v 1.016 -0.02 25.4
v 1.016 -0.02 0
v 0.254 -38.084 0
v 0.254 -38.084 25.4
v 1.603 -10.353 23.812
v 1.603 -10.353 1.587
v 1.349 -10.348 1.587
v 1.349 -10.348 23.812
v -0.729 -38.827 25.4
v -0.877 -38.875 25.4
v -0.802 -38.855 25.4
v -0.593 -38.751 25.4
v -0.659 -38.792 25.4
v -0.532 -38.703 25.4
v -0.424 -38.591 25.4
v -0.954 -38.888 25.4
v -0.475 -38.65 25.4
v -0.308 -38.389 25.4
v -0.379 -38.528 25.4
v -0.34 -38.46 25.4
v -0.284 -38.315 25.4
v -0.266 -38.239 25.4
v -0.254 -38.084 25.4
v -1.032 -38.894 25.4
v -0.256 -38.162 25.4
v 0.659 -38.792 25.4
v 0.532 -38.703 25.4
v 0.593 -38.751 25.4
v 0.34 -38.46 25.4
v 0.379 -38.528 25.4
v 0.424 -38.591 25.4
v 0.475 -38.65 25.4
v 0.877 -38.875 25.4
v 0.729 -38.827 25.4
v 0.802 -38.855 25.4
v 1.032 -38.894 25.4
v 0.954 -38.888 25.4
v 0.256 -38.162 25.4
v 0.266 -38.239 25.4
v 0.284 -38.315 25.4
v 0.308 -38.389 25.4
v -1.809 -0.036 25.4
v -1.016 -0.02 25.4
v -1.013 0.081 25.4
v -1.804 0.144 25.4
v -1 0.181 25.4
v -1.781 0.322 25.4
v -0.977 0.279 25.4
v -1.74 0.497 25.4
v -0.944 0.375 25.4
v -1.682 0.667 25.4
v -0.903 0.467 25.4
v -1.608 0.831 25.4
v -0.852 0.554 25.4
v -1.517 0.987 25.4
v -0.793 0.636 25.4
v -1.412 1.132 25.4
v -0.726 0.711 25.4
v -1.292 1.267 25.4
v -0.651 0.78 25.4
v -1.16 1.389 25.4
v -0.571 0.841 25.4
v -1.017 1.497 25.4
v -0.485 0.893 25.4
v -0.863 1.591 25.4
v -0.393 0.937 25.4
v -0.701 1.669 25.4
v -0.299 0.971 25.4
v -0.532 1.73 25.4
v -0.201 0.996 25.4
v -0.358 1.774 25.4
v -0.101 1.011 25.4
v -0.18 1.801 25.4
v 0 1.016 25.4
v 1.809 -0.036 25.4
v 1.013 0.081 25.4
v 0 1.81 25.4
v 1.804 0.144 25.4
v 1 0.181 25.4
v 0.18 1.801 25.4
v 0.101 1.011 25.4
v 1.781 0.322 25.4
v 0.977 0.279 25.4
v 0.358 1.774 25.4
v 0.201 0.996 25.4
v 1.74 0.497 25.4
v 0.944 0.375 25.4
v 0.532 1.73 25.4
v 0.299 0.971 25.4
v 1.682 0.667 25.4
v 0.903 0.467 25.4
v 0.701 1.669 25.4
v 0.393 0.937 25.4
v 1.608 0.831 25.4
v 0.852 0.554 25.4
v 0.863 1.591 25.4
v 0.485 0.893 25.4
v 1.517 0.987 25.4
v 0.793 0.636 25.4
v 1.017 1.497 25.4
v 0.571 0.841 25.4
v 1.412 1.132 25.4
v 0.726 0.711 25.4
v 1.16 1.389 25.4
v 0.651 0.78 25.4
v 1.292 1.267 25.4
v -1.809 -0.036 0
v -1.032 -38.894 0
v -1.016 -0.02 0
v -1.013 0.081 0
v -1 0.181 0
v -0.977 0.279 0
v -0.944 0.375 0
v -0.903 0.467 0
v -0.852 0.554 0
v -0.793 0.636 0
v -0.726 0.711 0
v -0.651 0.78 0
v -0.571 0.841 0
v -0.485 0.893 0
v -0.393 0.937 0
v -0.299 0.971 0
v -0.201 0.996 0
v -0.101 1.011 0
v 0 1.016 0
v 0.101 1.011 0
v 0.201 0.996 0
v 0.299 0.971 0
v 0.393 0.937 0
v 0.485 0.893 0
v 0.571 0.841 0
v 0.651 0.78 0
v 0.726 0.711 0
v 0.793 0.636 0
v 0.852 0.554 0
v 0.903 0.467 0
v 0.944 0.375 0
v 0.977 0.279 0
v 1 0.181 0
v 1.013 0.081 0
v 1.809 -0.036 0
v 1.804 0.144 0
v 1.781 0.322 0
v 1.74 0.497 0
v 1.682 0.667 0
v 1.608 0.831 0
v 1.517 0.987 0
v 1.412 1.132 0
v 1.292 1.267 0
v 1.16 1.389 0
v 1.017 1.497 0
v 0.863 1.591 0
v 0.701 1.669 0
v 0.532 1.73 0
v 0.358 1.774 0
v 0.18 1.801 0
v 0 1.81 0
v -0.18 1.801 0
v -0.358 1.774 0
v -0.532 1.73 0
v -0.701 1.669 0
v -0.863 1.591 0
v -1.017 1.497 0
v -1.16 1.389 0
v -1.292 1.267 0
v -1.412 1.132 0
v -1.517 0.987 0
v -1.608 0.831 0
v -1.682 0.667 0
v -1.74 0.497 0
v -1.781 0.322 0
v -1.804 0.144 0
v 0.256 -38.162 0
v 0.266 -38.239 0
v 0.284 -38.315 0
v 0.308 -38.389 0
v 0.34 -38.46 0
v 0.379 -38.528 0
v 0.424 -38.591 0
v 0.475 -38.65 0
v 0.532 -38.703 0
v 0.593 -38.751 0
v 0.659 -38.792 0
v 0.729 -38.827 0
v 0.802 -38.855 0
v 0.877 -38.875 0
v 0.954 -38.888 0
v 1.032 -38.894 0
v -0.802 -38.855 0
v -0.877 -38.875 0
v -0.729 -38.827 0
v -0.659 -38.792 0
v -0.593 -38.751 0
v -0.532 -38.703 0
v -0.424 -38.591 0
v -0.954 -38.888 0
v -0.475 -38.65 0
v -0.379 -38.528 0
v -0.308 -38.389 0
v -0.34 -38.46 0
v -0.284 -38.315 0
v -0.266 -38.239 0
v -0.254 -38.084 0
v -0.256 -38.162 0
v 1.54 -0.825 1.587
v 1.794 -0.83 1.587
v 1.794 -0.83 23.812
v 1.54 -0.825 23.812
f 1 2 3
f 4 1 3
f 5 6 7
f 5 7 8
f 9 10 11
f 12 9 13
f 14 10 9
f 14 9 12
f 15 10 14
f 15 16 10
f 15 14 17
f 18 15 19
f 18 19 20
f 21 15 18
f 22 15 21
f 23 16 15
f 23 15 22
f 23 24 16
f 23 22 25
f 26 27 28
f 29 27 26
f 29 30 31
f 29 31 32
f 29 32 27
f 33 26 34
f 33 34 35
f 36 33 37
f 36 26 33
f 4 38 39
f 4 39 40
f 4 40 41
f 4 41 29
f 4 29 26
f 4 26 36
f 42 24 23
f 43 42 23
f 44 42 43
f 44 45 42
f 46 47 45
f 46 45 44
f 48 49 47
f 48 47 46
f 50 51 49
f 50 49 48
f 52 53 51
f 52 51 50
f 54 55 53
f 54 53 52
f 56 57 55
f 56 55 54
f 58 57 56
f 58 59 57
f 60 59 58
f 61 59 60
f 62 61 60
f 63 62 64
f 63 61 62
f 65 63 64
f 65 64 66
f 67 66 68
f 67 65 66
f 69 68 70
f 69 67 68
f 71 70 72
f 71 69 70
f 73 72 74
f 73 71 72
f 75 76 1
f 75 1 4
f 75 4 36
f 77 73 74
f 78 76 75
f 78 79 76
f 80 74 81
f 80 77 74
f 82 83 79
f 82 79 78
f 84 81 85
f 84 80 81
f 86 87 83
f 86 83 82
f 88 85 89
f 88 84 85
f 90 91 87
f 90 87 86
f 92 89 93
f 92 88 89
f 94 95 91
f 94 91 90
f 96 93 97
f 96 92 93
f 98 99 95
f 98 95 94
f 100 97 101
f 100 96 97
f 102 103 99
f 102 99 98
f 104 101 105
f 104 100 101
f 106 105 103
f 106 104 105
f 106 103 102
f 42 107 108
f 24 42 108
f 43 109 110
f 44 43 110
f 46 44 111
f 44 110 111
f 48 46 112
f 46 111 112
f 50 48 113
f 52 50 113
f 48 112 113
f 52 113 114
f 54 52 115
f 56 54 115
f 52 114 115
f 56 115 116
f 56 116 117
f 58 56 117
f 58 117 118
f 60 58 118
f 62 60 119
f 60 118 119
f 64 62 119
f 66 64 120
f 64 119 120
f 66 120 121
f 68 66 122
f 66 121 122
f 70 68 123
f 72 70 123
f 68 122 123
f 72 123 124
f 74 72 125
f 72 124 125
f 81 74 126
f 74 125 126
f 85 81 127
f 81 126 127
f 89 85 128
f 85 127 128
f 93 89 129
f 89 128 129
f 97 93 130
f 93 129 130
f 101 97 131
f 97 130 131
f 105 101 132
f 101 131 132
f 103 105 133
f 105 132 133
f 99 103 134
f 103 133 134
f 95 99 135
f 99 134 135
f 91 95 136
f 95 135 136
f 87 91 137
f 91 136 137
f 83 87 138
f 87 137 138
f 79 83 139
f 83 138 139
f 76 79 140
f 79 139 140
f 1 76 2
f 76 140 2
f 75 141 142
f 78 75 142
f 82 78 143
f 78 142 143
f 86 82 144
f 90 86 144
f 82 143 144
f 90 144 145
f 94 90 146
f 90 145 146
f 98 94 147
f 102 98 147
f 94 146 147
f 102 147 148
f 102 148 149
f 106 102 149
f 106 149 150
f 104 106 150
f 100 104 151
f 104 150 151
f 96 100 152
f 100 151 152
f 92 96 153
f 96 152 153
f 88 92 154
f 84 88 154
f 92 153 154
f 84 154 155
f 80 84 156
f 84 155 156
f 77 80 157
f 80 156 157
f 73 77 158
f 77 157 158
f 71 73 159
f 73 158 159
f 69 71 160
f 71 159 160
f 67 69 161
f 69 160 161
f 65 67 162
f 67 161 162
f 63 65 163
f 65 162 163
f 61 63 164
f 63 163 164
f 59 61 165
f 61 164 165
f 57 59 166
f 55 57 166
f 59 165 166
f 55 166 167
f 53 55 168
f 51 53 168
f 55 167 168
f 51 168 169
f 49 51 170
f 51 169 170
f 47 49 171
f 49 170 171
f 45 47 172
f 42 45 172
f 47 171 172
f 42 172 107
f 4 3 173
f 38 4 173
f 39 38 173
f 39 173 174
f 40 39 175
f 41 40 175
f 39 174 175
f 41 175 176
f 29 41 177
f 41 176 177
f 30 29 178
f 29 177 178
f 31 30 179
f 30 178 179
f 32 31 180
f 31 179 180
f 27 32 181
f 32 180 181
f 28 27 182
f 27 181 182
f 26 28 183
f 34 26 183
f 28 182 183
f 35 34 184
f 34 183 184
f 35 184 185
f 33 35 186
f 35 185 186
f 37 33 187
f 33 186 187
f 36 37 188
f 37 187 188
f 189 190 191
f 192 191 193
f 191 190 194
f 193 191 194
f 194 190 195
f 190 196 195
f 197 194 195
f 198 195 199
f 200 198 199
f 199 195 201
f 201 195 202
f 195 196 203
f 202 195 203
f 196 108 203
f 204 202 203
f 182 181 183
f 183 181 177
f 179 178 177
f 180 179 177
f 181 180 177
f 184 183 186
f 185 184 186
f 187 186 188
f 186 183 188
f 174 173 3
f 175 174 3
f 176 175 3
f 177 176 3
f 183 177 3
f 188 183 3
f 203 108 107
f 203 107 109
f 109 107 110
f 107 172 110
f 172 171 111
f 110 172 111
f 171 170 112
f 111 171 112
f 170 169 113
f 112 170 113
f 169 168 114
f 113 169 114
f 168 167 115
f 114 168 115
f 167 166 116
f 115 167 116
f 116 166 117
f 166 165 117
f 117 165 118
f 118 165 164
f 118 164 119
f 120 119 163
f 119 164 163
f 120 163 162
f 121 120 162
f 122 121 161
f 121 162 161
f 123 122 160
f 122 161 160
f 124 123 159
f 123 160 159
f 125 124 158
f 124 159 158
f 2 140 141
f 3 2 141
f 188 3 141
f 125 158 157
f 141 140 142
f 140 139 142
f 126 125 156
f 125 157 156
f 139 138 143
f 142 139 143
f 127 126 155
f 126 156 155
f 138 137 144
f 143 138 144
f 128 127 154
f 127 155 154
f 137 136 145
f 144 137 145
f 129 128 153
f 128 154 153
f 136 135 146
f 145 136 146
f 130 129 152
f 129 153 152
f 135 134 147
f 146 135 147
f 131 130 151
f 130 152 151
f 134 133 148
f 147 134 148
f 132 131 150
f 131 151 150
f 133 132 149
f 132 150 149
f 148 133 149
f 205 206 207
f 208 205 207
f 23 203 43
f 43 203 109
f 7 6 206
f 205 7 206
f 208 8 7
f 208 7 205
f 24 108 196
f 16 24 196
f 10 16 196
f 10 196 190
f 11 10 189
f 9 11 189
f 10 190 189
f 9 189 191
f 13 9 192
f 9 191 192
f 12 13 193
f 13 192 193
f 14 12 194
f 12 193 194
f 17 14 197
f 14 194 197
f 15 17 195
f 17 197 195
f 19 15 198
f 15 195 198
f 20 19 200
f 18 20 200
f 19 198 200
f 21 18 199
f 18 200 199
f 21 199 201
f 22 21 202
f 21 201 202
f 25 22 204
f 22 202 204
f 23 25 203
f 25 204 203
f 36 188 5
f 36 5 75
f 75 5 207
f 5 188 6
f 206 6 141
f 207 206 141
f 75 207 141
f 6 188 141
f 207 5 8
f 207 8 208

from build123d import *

# Parameters (mm, degrees)
F1_DEPTH = 25.4
F2_W     = 9.525
F2_H     = 22.225
F3_DEPTH = 0.254


with BuildPart() as f1:
    # F0 (on Top) → F1 (new body)
    with BuildSketch(Plane.XY):
        with BuildLine():
            ThreePointArc((-1.015796583, -0.020329831), (0, 1.016), (1.015796583, -0.020329831))
            Line((1.015796583, -0.020329831), (0.254, -38.0841173196))
            ThreePointArc((0.254, -38.0841173196), (0.4752066949, -38.6499228834), (1.0317084, -38.8935910804))
            Line((1.0317084, -38.8935910804), (1.8093876634, -0.0362125114))
            ThreePointArc((1.8093876634, -0.0362125114), (0, 1.80975), (-1.8093876634, -0.0362125114))
            Line((-1.8093876634, -0.0362125114), (-1.0317084, -38.8935910804))
            ThreePointArc((-1.0317084, -38.8935910804), (-0.4752066949, -38.6499228834), (-0.254, -38.0841173196))
            Line((-0.254, -38.0841173196), (-1.015796583, -0.020329831))
        make_face()
    extrude(amount=F1_DEPTH)

    # F2 (on face) → F3 (cut)
    with BuildSketch(Plane(origin=(1.8093876634, -0.0362125114, 0), x_dir=(0.0200096762, 0.9997997864, 0), z_dir=(0.9997997864, -0.0200096762, 0))):
        with Locations((-5.55625, 12.7)):
            Rectangle(F2_W, F2_H)
    extrude(amount=-F3_DEPTH, mode=Mode.SUBTRACT)


solid = f1.part
